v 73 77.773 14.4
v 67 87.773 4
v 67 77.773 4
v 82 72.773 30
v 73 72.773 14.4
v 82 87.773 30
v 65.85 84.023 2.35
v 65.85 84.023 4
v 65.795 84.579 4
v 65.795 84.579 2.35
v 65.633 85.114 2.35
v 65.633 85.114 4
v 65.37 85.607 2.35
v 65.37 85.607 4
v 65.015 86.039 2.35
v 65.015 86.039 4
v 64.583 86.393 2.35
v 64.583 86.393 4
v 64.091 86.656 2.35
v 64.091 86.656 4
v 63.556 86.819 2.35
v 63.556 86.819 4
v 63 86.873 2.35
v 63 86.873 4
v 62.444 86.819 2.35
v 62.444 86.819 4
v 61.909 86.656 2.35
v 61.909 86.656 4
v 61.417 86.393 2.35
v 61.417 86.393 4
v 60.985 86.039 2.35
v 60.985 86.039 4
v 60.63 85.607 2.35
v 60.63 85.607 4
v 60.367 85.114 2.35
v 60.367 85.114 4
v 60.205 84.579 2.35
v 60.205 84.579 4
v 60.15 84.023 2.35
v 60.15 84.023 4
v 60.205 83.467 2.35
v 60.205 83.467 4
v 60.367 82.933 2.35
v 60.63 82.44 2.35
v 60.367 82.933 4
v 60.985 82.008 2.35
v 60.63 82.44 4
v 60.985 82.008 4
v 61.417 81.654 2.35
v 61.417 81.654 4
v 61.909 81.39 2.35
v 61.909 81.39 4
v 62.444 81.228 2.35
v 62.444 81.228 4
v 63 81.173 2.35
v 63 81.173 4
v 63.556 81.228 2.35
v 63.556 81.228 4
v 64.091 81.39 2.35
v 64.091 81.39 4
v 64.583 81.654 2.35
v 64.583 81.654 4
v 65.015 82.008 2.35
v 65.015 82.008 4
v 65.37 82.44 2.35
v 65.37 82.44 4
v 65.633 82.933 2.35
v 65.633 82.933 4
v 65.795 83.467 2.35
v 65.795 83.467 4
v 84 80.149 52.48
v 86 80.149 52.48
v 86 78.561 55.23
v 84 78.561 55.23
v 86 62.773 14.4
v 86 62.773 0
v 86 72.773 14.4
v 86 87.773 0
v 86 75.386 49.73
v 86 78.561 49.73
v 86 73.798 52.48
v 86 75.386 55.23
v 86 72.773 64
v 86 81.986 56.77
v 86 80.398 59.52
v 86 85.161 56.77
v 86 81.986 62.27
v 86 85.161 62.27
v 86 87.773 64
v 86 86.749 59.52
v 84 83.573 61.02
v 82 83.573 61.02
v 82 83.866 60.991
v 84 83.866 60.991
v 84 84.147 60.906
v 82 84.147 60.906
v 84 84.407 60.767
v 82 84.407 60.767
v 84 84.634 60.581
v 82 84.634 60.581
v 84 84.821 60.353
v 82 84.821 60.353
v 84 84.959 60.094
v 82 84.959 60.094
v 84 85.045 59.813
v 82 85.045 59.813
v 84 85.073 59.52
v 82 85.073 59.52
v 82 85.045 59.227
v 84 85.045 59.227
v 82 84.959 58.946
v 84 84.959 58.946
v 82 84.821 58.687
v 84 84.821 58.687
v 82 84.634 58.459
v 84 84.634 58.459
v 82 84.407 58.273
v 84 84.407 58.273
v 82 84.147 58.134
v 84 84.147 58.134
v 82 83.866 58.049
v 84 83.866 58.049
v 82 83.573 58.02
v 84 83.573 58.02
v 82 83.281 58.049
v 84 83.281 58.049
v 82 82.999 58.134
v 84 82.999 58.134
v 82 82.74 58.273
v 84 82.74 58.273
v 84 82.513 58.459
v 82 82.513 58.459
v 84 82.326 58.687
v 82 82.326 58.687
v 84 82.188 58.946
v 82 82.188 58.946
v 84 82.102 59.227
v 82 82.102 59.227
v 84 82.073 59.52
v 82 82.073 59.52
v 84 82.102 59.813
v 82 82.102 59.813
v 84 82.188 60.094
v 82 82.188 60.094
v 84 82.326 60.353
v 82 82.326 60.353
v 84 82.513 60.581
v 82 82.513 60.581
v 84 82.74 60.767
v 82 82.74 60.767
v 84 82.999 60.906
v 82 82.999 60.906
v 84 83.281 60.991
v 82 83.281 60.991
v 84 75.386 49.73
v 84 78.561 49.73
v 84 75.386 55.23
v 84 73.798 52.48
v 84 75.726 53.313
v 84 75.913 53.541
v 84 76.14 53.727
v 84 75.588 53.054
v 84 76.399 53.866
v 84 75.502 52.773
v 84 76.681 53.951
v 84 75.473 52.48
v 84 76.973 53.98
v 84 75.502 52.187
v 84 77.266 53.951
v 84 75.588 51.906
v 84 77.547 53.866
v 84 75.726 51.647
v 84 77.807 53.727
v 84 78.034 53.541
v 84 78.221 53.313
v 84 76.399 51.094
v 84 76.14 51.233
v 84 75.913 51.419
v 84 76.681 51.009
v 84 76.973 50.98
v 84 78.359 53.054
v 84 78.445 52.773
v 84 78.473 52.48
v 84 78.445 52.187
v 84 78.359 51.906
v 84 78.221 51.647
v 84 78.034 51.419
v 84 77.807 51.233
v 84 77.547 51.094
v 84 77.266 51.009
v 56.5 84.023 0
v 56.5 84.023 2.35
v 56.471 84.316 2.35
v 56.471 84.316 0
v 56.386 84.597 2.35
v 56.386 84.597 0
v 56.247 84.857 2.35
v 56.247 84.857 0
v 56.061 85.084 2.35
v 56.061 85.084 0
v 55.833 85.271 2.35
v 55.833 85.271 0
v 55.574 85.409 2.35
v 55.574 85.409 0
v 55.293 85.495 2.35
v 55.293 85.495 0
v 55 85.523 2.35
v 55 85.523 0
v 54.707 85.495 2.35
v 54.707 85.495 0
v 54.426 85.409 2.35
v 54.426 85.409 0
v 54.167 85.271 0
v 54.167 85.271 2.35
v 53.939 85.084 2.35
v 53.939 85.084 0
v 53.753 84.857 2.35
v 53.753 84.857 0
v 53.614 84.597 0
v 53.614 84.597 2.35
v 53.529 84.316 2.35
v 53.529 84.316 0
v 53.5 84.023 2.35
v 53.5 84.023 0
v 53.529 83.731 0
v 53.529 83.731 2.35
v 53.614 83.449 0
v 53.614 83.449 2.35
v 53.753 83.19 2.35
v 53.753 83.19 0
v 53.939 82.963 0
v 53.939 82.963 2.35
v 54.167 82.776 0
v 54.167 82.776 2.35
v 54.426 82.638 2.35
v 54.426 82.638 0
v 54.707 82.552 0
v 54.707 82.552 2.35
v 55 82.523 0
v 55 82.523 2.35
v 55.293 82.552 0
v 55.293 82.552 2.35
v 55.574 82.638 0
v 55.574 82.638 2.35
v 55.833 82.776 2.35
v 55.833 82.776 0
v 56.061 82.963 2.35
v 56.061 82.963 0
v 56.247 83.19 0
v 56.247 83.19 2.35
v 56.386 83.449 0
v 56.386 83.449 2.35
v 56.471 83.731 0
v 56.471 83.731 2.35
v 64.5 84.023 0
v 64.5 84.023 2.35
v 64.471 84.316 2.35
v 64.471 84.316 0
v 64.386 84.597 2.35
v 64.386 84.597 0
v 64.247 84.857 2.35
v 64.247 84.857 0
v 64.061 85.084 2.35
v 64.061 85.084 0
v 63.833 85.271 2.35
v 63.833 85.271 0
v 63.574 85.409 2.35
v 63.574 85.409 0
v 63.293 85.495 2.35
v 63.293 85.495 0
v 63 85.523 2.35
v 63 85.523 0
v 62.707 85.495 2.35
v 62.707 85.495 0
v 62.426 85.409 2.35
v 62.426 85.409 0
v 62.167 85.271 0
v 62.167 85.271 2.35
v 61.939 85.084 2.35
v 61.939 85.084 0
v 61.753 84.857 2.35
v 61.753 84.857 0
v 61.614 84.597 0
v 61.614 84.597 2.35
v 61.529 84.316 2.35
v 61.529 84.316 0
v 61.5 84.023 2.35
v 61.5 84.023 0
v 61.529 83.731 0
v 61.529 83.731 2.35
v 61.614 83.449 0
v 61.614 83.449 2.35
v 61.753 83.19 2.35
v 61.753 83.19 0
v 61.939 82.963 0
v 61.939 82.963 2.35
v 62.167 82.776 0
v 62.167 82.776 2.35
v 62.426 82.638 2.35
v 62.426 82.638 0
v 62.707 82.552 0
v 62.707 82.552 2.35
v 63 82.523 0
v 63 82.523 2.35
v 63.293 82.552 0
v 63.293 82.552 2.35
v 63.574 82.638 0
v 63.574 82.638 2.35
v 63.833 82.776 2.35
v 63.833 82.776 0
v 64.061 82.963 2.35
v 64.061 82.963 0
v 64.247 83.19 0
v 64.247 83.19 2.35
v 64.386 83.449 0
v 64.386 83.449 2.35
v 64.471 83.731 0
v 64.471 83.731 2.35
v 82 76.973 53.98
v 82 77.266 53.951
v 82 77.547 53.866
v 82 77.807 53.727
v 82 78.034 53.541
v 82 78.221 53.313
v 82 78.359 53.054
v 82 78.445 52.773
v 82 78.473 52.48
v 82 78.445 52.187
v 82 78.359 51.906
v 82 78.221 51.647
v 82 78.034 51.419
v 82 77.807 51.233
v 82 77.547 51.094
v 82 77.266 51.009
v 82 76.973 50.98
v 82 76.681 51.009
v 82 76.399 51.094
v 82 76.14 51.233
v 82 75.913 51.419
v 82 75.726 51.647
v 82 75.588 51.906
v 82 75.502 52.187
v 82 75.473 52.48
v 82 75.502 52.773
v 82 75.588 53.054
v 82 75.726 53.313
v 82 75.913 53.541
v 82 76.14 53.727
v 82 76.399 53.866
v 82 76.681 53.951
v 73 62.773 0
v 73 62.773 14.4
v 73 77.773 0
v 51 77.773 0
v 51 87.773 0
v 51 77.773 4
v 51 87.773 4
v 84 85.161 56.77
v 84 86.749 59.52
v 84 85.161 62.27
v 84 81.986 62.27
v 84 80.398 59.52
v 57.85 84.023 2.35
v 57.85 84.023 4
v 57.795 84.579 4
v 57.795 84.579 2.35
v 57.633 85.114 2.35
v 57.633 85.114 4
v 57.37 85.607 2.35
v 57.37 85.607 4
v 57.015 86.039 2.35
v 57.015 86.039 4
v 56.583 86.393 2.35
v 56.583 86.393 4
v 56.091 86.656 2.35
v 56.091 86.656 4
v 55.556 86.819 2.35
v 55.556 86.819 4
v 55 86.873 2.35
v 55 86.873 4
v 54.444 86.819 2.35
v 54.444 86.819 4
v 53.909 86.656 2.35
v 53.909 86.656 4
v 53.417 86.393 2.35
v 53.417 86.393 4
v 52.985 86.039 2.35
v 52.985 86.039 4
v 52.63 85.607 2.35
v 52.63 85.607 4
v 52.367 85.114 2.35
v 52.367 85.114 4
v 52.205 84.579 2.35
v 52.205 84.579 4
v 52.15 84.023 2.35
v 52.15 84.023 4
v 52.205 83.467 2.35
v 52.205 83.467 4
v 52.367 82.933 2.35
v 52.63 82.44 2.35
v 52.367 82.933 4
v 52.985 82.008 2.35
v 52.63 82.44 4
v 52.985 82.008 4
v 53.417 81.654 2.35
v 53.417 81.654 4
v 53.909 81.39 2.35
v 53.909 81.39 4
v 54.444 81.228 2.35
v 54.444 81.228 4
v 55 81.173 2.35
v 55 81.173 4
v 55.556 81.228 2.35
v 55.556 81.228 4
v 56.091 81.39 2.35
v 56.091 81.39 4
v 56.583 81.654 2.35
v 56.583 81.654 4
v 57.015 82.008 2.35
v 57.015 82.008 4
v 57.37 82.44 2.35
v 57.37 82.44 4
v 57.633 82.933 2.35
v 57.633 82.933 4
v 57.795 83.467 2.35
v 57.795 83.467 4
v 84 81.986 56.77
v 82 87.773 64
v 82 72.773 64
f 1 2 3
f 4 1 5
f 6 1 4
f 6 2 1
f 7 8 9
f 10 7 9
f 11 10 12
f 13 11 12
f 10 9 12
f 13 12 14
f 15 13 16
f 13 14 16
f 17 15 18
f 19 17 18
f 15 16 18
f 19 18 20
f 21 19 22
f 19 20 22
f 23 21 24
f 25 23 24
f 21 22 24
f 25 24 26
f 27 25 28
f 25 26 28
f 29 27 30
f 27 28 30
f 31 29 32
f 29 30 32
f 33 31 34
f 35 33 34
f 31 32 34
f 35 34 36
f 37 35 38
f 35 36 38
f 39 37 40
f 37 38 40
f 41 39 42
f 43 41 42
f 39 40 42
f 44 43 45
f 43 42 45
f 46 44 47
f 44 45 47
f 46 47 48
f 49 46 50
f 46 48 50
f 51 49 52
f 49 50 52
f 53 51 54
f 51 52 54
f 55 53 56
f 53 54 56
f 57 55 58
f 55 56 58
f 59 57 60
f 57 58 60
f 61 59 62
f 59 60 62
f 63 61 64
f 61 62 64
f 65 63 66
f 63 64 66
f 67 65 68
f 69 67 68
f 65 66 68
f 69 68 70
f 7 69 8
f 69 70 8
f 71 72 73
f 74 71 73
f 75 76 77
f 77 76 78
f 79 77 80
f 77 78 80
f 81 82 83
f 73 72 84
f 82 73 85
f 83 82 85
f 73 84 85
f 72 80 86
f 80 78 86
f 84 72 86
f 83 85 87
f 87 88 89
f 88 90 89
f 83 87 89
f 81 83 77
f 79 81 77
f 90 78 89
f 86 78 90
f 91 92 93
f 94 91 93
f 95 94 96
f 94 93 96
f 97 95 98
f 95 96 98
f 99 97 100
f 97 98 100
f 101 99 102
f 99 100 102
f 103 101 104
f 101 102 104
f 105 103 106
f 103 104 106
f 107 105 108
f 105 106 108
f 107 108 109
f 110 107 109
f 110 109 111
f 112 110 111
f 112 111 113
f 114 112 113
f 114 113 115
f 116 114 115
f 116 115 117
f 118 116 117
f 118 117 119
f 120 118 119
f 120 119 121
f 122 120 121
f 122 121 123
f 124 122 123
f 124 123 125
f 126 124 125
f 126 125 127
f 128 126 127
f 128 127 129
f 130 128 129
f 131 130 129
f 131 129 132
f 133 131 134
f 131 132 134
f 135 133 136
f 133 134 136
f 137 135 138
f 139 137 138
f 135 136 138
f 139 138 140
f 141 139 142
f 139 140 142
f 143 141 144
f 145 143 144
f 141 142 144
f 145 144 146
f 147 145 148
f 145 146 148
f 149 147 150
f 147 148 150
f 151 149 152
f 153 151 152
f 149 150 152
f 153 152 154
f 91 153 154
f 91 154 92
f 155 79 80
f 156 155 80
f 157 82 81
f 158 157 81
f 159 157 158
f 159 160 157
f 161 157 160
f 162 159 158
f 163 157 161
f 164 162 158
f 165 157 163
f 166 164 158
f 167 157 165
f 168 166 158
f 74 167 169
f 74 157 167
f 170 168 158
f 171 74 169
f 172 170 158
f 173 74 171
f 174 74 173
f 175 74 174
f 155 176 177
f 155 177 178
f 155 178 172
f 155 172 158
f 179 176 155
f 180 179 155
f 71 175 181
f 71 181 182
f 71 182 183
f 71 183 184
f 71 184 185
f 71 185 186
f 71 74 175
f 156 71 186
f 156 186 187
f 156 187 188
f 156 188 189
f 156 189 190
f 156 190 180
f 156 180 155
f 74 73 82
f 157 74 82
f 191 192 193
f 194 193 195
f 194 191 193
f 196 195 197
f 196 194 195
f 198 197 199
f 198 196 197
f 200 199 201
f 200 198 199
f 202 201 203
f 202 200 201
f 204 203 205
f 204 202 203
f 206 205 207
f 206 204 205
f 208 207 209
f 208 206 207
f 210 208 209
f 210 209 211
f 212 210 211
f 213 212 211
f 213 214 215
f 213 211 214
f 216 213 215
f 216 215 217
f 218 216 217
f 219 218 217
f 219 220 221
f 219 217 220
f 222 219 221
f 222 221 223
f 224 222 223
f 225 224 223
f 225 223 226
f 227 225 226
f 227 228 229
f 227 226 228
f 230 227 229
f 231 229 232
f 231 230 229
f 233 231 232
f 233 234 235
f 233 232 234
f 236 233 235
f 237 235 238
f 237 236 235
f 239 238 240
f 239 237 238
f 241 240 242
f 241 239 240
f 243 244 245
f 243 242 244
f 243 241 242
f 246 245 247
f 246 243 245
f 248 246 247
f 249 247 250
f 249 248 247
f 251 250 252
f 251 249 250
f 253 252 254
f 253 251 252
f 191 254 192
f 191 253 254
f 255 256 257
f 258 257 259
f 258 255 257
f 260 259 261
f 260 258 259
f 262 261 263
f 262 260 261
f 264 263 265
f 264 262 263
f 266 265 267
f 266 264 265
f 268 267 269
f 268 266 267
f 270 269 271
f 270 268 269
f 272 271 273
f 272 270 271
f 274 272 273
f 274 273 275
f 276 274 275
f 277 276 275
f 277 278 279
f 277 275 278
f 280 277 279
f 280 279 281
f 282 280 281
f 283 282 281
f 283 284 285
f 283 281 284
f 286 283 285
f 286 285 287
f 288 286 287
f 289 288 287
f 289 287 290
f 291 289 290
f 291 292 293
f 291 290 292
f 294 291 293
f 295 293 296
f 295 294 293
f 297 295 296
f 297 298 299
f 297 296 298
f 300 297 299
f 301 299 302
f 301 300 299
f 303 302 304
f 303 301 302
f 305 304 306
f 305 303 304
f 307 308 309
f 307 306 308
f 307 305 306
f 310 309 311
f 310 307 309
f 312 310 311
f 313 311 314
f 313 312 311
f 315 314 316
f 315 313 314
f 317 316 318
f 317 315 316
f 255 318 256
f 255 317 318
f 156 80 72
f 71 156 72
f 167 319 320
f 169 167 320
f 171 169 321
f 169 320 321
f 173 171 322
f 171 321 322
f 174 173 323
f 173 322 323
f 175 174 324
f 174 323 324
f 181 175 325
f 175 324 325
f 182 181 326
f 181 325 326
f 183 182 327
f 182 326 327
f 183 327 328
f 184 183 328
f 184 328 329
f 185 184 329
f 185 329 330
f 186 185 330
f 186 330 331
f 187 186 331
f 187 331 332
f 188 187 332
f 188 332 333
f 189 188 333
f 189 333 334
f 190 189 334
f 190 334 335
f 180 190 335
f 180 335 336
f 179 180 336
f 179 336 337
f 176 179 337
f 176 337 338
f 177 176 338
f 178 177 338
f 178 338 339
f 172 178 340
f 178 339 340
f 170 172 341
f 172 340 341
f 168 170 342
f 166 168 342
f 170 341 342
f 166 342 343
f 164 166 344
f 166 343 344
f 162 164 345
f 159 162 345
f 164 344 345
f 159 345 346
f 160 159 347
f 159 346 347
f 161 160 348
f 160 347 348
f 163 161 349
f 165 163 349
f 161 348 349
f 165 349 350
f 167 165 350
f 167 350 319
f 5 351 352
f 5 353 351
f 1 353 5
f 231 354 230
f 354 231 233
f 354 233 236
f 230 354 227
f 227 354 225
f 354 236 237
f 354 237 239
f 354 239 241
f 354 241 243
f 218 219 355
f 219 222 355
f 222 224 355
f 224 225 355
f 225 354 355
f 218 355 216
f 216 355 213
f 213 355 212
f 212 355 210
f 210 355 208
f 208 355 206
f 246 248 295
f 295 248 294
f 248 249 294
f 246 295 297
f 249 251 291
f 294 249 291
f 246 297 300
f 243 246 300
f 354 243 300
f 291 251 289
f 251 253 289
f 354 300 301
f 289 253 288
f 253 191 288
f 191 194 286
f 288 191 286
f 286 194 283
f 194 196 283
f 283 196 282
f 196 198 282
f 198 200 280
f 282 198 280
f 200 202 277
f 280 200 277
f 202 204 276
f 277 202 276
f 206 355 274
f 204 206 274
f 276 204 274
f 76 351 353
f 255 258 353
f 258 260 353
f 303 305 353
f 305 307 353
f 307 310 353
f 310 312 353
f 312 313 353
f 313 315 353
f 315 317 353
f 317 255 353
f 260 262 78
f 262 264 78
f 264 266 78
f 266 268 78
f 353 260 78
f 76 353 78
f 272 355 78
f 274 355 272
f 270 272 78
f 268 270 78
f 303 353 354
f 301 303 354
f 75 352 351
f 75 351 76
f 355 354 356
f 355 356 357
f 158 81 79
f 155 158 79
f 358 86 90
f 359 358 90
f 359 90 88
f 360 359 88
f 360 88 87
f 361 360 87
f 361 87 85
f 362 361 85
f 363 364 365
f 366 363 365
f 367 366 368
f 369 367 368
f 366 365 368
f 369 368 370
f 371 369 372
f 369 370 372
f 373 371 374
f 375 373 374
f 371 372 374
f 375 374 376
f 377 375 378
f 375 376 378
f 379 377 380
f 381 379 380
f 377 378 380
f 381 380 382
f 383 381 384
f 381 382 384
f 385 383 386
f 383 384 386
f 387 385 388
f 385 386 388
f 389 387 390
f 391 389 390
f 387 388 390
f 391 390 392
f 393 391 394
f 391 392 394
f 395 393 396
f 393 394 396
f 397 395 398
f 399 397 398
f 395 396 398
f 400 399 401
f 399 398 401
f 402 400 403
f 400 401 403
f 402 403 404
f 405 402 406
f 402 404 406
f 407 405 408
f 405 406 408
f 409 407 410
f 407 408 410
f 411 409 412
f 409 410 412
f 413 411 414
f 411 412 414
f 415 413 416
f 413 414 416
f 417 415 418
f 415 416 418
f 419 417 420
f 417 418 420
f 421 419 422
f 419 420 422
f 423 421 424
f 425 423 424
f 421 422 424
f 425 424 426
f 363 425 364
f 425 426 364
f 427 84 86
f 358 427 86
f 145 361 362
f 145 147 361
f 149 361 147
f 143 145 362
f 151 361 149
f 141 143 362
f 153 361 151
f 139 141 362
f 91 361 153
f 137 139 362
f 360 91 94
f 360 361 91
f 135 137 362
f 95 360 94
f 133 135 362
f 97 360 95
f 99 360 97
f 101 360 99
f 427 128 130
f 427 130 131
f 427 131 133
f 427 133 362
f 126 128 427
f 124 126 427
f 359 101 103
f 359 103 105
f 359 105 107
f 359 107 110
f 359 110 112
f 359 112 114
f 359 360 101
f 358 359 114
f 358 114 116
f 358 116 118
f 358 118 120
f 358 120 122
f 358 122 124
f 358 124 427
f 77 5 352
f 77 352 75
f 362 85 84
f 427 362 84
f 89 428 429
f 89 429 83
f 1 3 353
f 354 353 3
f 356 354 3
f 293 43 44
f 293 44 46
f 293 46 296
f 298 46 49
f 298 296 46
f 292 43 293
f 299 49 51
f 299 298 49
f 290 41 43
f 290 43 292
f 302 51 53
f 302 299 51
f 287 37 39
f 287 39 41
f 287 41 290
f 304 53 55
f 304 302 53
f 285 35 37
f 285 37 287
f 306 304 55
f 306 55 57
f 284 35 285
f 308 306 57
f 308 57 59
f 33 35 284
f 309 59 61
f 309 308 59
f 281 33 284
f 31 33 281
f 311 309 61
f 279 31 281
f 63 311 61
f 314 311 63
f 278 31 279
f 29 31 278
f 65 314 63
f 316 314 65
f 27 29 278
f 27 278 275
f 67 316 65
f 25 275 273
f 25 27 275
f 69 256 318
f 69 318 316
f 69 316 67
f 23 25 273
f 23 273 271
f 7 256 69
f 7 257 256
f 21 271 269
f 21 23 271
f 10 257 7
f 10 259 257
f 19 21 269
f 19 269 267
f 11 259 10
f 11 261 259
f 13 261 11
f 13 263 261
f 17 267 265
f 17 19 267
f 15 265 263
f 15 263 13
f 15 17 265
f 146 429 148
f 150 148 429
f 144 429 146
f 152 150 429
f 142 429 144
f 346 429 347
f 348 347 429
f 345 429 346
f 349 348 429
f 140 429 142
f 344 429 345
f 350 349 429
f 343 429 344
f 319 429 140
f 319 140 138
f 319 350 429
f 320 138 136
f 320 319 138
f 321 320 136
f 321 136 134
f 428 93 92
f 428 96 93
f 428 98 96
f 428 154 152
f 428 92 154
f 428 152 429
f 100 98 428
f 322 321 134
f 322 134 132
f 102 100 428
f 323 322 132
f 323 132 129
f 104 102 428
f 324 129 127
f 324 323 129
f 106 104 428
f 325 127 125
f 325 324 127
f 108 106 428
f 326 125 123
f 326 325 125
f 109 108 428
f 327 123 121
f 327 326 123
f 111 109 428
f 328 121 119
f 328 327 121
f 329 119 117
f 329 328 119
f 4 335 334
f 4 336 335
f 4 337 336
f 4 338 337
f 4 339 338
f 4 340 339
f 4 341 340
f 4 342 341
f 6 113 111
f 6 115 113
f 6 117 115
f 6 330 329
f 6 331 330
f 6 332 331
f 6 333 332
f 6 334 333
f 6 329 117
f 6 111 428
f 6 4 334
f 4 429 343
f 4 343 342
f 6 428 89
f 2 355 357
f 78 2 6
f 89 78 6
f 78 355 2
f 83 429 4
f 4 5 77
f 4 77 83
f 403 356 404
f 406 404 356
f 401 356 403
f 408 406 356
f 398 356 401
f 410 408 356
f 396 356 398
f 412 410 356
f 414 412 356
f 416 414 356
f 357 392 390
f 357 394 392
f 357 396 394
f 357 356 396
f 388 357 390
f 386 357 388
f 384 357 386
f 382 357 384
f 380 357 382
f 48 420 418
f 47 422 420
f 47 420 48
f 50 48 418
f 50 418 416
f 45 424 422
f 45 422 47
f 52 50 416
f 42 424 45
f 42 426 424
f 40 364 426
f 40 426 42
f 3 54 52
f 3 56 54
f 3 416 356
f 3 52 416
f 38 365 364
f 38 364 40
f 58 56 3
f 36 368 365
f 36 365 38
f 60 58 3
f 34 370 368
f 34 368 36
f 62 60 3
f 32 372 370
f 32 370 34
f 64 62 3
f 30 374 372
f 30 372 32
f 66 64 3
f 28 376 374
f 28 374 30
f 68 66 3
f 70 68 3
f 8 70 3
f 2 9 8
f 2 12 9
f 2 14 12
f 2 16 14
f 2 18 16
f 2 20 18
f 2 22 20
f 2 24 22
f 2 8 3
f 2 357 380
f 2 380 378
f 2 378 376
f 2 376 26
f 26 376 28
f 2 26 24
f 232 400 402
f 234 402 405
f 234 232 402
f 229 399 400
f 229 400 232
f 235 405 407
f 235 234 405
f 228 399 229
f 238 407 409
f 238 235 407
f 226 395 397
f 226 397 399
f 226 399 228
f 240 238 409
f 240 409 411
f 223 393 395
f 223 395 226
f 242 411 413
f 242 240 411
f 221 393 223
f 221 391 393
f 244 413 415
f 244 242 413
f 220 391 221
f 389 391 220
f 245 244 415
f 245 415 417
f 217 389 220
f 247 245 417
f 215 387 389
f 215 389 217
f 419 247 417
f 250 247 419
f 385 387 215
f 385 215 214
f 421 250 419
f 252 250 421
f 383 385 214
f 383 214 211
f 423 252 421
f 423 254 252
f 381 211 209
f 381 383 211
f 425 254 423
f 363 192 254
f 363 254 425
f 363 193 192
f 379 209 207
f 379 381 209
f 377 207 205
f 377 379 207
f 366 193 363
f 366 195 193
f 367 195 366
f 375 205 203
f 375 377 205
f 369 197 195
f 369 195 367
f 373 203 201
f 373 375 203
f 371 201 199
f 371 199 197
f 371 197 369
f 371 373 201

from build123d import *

# Parameters (mm, degrees)
CROQUIS1_W              = 4
CROQUIS1_H              = 15
CROQUIS1_W_2            = 15
CROQUIS1_W_3            = 16
CROQUIS1_R              = 1.5
SALIENTE_EXTRUIR1_DEPTH = 4
CROQUIS2_W              = 4
CROQUIS2_H              = 15
SALIENTE_EXTRUIR2_DEPTH = 60
SALIENTE_EXTRUIR4_START = -7.5
SALIENTE_EXTRUIR4_DEPTH = 15
CROQUIS8_R              = 2.85
CORTAR_EXTRUIR3_DEPTH   = 1.65
CORTAR_EXTRUIR2_REACH   = 114.965
CROQUIS7_R              = 1.5
CORTAR_EXTRUIR5_DEPTH   = 2
CROQUIS10_W             = 22
CROQUIS10_H             = 5
CORTAR_EXTRUIR6_DEPTH   = 22
CROQUIS11_W             = 13
CROQUIS11_H             = 14.4
SALIENTE_EXTRUIR5_DEPTH = 10


with BuildPart() as part:
    # Croquis1 → Saliente-Extruir1 (new body)
    # profile 1 of 3: a face of its own
    with BuildSketch(Plane.XY):
        with Locations((84, 80.273389683)):
            Rectangle(CROQUIS1_W, CROQUIS1_H)
    # profile 2 of 3: a face of its own
    with BuildSketch(Plane.XY):
        with Locations((74.5, 80.273389683)):
            Rectangle(CROQUIS1_W_2, CROQUIS1_H)
    # profile 3 of 3: a face of its own
    with BuildSketch(Plane.XY):
        with Locations((59, 80.273389683)):
            Rectangle(CROQUIS1_W_3, CROQUIS1_H)
        with Locations((55, 84.023389683)):
            Circle(CROQUIS1_R, mode=Mode.SUBTRACT)
        with Locations((63, 84.023389683)):
            Circle(CROQUIS1_R, mode=Mode.SUBTRACT)
    extrude(amount=SALIENTE_EXTRUIR1_DEPTH)

    # Croquis2 → Saliente-Extruir2 (add)
    with BuildSketch(Plane.XY.offset(4)):
        with Locations((84, 80.273389683)):
            Rectangle(CROQUIS2_W, CROQUIS2_H)
    extrude(amount=SALIENTE_EXTRUIR2_DEPTH)

    # Croquis6 → Saliente-Extruir4 (add)
    with BuildSketch(Plane(origin=(0, 80.273389683, 0), x_dir=(-1, 0, 0), z_dir=(0, -1, 0)).offset(SALIENTE_EXTRUIR4_START)):
        Polygon((-82, -30), (-82, -4), (-67, -4), align=None)
    extrude(amount=SALIENTE_EXTRUIR4_DEPTH)

    # Croquis8 → Cortar-Extruir3 (cut)
    with BuildSketch(Plane.XY.offset(4)):
        with Locations((63, 84.023389683)):
            Circle(CROQUIS8_R)
        with Locations((55, 84.023389683)):
            Circle(CROQUIS8_R)
    extrude(amount=-CORTAR_EXTRUIR3_DEPTH, mode=Mode.SUBTRACT)

    # Croquis7 → Cortar-Extruir2 (cut, up to next)
    with BuildSketch(Plane.ZY.offset(-82), mode=Mode.PRIVATE) as cortar_extruir2_sk1:
        with Locations((52.48, 76.973389683)):
            Circle(CROQUIS7_R)
    cortar_extruir2_tool1 = extrude(cortar_extruir2_sk1.sketch, amount=-CORTAR_EXTRUIR2_REACH, mode=Mode.PRIVATE) & part.part
    # Croquis7 → Cortar-Extruir2 (cut, up to next)
    with BuildSketch(Plane.ZY.offset(-82), mode=Mode.PRIVATE) as cortar_extruir2_sk2:
        with Locations((59.52, 83.573389683)):
            Circle(CROQUIS7_R)
    cortar_extruir2_tool2 = extrude(cortar_extruir2_sk2.sketch, amount=-CORTAR_EXTRUIR2_REACH, mode=Mode.PRIVATE) & part.part
    add(cortar_extruir2_tool1.solids().sort_by_distance((82, 76.97339, 52.48))[0], mode=Mode.SUBTRACT)
    add(cortar_extruir2_tool2.solids().sort_by_distance((82, 83.57339, 59.52))[0], mode=Mode.SUBTRACT)

    # Croquis9 → Cortar-Extruir5 (cut)
    with BuildSketch(Plane(origin=(86, 0, 0), x_dir=(0, 0, -1), z_dir=(1, 0, 0))):
        Polygon((-55.23, 75.385676443), (-52.48, 73.797963203), (-49.73, 75.385676443), (-49.73, 78.561102924), (-52.48, 80.148816164), (-55.23, 78.561102924), align=None)
        Polygon((-62.27, 81.985676443), (-59.52, 80.397963203), (-56.77, 81.985676443), (-56.77, 85.161102924), (-59.52, 86.748816164), (-62.27, 85.161102924), align=None)
    extrude(amount=-CORTAR_EXTRUIR5_DEPTH, mode=Mode.SUBTRACT)

    # Croquis10 → Cortar-Extruir6 (cut)
    with BuildSketch(Plane.ZY.offset(-51)):
        with Locations((11, 75.273389683)):
            Rectangle(CROQUIS10_W, CROQUIS10_H)
    extrude(amount=-CORTAR_EXTRUIR6_DEPTH, mode=Mode.SUBTRACT)

    # Croquis11 → Saliente-Extruir5 (add)
    with BuildSketch(Plane.XZ.offset(-72.773389683)):
        with Locations((79.5, 7.2)):
            Rectangle(CROQUIS11_W, CROQUIS11_H)
    extrude(amount=SALIENTE_EXTRUIR5_DEPTH)


solid = part.part
